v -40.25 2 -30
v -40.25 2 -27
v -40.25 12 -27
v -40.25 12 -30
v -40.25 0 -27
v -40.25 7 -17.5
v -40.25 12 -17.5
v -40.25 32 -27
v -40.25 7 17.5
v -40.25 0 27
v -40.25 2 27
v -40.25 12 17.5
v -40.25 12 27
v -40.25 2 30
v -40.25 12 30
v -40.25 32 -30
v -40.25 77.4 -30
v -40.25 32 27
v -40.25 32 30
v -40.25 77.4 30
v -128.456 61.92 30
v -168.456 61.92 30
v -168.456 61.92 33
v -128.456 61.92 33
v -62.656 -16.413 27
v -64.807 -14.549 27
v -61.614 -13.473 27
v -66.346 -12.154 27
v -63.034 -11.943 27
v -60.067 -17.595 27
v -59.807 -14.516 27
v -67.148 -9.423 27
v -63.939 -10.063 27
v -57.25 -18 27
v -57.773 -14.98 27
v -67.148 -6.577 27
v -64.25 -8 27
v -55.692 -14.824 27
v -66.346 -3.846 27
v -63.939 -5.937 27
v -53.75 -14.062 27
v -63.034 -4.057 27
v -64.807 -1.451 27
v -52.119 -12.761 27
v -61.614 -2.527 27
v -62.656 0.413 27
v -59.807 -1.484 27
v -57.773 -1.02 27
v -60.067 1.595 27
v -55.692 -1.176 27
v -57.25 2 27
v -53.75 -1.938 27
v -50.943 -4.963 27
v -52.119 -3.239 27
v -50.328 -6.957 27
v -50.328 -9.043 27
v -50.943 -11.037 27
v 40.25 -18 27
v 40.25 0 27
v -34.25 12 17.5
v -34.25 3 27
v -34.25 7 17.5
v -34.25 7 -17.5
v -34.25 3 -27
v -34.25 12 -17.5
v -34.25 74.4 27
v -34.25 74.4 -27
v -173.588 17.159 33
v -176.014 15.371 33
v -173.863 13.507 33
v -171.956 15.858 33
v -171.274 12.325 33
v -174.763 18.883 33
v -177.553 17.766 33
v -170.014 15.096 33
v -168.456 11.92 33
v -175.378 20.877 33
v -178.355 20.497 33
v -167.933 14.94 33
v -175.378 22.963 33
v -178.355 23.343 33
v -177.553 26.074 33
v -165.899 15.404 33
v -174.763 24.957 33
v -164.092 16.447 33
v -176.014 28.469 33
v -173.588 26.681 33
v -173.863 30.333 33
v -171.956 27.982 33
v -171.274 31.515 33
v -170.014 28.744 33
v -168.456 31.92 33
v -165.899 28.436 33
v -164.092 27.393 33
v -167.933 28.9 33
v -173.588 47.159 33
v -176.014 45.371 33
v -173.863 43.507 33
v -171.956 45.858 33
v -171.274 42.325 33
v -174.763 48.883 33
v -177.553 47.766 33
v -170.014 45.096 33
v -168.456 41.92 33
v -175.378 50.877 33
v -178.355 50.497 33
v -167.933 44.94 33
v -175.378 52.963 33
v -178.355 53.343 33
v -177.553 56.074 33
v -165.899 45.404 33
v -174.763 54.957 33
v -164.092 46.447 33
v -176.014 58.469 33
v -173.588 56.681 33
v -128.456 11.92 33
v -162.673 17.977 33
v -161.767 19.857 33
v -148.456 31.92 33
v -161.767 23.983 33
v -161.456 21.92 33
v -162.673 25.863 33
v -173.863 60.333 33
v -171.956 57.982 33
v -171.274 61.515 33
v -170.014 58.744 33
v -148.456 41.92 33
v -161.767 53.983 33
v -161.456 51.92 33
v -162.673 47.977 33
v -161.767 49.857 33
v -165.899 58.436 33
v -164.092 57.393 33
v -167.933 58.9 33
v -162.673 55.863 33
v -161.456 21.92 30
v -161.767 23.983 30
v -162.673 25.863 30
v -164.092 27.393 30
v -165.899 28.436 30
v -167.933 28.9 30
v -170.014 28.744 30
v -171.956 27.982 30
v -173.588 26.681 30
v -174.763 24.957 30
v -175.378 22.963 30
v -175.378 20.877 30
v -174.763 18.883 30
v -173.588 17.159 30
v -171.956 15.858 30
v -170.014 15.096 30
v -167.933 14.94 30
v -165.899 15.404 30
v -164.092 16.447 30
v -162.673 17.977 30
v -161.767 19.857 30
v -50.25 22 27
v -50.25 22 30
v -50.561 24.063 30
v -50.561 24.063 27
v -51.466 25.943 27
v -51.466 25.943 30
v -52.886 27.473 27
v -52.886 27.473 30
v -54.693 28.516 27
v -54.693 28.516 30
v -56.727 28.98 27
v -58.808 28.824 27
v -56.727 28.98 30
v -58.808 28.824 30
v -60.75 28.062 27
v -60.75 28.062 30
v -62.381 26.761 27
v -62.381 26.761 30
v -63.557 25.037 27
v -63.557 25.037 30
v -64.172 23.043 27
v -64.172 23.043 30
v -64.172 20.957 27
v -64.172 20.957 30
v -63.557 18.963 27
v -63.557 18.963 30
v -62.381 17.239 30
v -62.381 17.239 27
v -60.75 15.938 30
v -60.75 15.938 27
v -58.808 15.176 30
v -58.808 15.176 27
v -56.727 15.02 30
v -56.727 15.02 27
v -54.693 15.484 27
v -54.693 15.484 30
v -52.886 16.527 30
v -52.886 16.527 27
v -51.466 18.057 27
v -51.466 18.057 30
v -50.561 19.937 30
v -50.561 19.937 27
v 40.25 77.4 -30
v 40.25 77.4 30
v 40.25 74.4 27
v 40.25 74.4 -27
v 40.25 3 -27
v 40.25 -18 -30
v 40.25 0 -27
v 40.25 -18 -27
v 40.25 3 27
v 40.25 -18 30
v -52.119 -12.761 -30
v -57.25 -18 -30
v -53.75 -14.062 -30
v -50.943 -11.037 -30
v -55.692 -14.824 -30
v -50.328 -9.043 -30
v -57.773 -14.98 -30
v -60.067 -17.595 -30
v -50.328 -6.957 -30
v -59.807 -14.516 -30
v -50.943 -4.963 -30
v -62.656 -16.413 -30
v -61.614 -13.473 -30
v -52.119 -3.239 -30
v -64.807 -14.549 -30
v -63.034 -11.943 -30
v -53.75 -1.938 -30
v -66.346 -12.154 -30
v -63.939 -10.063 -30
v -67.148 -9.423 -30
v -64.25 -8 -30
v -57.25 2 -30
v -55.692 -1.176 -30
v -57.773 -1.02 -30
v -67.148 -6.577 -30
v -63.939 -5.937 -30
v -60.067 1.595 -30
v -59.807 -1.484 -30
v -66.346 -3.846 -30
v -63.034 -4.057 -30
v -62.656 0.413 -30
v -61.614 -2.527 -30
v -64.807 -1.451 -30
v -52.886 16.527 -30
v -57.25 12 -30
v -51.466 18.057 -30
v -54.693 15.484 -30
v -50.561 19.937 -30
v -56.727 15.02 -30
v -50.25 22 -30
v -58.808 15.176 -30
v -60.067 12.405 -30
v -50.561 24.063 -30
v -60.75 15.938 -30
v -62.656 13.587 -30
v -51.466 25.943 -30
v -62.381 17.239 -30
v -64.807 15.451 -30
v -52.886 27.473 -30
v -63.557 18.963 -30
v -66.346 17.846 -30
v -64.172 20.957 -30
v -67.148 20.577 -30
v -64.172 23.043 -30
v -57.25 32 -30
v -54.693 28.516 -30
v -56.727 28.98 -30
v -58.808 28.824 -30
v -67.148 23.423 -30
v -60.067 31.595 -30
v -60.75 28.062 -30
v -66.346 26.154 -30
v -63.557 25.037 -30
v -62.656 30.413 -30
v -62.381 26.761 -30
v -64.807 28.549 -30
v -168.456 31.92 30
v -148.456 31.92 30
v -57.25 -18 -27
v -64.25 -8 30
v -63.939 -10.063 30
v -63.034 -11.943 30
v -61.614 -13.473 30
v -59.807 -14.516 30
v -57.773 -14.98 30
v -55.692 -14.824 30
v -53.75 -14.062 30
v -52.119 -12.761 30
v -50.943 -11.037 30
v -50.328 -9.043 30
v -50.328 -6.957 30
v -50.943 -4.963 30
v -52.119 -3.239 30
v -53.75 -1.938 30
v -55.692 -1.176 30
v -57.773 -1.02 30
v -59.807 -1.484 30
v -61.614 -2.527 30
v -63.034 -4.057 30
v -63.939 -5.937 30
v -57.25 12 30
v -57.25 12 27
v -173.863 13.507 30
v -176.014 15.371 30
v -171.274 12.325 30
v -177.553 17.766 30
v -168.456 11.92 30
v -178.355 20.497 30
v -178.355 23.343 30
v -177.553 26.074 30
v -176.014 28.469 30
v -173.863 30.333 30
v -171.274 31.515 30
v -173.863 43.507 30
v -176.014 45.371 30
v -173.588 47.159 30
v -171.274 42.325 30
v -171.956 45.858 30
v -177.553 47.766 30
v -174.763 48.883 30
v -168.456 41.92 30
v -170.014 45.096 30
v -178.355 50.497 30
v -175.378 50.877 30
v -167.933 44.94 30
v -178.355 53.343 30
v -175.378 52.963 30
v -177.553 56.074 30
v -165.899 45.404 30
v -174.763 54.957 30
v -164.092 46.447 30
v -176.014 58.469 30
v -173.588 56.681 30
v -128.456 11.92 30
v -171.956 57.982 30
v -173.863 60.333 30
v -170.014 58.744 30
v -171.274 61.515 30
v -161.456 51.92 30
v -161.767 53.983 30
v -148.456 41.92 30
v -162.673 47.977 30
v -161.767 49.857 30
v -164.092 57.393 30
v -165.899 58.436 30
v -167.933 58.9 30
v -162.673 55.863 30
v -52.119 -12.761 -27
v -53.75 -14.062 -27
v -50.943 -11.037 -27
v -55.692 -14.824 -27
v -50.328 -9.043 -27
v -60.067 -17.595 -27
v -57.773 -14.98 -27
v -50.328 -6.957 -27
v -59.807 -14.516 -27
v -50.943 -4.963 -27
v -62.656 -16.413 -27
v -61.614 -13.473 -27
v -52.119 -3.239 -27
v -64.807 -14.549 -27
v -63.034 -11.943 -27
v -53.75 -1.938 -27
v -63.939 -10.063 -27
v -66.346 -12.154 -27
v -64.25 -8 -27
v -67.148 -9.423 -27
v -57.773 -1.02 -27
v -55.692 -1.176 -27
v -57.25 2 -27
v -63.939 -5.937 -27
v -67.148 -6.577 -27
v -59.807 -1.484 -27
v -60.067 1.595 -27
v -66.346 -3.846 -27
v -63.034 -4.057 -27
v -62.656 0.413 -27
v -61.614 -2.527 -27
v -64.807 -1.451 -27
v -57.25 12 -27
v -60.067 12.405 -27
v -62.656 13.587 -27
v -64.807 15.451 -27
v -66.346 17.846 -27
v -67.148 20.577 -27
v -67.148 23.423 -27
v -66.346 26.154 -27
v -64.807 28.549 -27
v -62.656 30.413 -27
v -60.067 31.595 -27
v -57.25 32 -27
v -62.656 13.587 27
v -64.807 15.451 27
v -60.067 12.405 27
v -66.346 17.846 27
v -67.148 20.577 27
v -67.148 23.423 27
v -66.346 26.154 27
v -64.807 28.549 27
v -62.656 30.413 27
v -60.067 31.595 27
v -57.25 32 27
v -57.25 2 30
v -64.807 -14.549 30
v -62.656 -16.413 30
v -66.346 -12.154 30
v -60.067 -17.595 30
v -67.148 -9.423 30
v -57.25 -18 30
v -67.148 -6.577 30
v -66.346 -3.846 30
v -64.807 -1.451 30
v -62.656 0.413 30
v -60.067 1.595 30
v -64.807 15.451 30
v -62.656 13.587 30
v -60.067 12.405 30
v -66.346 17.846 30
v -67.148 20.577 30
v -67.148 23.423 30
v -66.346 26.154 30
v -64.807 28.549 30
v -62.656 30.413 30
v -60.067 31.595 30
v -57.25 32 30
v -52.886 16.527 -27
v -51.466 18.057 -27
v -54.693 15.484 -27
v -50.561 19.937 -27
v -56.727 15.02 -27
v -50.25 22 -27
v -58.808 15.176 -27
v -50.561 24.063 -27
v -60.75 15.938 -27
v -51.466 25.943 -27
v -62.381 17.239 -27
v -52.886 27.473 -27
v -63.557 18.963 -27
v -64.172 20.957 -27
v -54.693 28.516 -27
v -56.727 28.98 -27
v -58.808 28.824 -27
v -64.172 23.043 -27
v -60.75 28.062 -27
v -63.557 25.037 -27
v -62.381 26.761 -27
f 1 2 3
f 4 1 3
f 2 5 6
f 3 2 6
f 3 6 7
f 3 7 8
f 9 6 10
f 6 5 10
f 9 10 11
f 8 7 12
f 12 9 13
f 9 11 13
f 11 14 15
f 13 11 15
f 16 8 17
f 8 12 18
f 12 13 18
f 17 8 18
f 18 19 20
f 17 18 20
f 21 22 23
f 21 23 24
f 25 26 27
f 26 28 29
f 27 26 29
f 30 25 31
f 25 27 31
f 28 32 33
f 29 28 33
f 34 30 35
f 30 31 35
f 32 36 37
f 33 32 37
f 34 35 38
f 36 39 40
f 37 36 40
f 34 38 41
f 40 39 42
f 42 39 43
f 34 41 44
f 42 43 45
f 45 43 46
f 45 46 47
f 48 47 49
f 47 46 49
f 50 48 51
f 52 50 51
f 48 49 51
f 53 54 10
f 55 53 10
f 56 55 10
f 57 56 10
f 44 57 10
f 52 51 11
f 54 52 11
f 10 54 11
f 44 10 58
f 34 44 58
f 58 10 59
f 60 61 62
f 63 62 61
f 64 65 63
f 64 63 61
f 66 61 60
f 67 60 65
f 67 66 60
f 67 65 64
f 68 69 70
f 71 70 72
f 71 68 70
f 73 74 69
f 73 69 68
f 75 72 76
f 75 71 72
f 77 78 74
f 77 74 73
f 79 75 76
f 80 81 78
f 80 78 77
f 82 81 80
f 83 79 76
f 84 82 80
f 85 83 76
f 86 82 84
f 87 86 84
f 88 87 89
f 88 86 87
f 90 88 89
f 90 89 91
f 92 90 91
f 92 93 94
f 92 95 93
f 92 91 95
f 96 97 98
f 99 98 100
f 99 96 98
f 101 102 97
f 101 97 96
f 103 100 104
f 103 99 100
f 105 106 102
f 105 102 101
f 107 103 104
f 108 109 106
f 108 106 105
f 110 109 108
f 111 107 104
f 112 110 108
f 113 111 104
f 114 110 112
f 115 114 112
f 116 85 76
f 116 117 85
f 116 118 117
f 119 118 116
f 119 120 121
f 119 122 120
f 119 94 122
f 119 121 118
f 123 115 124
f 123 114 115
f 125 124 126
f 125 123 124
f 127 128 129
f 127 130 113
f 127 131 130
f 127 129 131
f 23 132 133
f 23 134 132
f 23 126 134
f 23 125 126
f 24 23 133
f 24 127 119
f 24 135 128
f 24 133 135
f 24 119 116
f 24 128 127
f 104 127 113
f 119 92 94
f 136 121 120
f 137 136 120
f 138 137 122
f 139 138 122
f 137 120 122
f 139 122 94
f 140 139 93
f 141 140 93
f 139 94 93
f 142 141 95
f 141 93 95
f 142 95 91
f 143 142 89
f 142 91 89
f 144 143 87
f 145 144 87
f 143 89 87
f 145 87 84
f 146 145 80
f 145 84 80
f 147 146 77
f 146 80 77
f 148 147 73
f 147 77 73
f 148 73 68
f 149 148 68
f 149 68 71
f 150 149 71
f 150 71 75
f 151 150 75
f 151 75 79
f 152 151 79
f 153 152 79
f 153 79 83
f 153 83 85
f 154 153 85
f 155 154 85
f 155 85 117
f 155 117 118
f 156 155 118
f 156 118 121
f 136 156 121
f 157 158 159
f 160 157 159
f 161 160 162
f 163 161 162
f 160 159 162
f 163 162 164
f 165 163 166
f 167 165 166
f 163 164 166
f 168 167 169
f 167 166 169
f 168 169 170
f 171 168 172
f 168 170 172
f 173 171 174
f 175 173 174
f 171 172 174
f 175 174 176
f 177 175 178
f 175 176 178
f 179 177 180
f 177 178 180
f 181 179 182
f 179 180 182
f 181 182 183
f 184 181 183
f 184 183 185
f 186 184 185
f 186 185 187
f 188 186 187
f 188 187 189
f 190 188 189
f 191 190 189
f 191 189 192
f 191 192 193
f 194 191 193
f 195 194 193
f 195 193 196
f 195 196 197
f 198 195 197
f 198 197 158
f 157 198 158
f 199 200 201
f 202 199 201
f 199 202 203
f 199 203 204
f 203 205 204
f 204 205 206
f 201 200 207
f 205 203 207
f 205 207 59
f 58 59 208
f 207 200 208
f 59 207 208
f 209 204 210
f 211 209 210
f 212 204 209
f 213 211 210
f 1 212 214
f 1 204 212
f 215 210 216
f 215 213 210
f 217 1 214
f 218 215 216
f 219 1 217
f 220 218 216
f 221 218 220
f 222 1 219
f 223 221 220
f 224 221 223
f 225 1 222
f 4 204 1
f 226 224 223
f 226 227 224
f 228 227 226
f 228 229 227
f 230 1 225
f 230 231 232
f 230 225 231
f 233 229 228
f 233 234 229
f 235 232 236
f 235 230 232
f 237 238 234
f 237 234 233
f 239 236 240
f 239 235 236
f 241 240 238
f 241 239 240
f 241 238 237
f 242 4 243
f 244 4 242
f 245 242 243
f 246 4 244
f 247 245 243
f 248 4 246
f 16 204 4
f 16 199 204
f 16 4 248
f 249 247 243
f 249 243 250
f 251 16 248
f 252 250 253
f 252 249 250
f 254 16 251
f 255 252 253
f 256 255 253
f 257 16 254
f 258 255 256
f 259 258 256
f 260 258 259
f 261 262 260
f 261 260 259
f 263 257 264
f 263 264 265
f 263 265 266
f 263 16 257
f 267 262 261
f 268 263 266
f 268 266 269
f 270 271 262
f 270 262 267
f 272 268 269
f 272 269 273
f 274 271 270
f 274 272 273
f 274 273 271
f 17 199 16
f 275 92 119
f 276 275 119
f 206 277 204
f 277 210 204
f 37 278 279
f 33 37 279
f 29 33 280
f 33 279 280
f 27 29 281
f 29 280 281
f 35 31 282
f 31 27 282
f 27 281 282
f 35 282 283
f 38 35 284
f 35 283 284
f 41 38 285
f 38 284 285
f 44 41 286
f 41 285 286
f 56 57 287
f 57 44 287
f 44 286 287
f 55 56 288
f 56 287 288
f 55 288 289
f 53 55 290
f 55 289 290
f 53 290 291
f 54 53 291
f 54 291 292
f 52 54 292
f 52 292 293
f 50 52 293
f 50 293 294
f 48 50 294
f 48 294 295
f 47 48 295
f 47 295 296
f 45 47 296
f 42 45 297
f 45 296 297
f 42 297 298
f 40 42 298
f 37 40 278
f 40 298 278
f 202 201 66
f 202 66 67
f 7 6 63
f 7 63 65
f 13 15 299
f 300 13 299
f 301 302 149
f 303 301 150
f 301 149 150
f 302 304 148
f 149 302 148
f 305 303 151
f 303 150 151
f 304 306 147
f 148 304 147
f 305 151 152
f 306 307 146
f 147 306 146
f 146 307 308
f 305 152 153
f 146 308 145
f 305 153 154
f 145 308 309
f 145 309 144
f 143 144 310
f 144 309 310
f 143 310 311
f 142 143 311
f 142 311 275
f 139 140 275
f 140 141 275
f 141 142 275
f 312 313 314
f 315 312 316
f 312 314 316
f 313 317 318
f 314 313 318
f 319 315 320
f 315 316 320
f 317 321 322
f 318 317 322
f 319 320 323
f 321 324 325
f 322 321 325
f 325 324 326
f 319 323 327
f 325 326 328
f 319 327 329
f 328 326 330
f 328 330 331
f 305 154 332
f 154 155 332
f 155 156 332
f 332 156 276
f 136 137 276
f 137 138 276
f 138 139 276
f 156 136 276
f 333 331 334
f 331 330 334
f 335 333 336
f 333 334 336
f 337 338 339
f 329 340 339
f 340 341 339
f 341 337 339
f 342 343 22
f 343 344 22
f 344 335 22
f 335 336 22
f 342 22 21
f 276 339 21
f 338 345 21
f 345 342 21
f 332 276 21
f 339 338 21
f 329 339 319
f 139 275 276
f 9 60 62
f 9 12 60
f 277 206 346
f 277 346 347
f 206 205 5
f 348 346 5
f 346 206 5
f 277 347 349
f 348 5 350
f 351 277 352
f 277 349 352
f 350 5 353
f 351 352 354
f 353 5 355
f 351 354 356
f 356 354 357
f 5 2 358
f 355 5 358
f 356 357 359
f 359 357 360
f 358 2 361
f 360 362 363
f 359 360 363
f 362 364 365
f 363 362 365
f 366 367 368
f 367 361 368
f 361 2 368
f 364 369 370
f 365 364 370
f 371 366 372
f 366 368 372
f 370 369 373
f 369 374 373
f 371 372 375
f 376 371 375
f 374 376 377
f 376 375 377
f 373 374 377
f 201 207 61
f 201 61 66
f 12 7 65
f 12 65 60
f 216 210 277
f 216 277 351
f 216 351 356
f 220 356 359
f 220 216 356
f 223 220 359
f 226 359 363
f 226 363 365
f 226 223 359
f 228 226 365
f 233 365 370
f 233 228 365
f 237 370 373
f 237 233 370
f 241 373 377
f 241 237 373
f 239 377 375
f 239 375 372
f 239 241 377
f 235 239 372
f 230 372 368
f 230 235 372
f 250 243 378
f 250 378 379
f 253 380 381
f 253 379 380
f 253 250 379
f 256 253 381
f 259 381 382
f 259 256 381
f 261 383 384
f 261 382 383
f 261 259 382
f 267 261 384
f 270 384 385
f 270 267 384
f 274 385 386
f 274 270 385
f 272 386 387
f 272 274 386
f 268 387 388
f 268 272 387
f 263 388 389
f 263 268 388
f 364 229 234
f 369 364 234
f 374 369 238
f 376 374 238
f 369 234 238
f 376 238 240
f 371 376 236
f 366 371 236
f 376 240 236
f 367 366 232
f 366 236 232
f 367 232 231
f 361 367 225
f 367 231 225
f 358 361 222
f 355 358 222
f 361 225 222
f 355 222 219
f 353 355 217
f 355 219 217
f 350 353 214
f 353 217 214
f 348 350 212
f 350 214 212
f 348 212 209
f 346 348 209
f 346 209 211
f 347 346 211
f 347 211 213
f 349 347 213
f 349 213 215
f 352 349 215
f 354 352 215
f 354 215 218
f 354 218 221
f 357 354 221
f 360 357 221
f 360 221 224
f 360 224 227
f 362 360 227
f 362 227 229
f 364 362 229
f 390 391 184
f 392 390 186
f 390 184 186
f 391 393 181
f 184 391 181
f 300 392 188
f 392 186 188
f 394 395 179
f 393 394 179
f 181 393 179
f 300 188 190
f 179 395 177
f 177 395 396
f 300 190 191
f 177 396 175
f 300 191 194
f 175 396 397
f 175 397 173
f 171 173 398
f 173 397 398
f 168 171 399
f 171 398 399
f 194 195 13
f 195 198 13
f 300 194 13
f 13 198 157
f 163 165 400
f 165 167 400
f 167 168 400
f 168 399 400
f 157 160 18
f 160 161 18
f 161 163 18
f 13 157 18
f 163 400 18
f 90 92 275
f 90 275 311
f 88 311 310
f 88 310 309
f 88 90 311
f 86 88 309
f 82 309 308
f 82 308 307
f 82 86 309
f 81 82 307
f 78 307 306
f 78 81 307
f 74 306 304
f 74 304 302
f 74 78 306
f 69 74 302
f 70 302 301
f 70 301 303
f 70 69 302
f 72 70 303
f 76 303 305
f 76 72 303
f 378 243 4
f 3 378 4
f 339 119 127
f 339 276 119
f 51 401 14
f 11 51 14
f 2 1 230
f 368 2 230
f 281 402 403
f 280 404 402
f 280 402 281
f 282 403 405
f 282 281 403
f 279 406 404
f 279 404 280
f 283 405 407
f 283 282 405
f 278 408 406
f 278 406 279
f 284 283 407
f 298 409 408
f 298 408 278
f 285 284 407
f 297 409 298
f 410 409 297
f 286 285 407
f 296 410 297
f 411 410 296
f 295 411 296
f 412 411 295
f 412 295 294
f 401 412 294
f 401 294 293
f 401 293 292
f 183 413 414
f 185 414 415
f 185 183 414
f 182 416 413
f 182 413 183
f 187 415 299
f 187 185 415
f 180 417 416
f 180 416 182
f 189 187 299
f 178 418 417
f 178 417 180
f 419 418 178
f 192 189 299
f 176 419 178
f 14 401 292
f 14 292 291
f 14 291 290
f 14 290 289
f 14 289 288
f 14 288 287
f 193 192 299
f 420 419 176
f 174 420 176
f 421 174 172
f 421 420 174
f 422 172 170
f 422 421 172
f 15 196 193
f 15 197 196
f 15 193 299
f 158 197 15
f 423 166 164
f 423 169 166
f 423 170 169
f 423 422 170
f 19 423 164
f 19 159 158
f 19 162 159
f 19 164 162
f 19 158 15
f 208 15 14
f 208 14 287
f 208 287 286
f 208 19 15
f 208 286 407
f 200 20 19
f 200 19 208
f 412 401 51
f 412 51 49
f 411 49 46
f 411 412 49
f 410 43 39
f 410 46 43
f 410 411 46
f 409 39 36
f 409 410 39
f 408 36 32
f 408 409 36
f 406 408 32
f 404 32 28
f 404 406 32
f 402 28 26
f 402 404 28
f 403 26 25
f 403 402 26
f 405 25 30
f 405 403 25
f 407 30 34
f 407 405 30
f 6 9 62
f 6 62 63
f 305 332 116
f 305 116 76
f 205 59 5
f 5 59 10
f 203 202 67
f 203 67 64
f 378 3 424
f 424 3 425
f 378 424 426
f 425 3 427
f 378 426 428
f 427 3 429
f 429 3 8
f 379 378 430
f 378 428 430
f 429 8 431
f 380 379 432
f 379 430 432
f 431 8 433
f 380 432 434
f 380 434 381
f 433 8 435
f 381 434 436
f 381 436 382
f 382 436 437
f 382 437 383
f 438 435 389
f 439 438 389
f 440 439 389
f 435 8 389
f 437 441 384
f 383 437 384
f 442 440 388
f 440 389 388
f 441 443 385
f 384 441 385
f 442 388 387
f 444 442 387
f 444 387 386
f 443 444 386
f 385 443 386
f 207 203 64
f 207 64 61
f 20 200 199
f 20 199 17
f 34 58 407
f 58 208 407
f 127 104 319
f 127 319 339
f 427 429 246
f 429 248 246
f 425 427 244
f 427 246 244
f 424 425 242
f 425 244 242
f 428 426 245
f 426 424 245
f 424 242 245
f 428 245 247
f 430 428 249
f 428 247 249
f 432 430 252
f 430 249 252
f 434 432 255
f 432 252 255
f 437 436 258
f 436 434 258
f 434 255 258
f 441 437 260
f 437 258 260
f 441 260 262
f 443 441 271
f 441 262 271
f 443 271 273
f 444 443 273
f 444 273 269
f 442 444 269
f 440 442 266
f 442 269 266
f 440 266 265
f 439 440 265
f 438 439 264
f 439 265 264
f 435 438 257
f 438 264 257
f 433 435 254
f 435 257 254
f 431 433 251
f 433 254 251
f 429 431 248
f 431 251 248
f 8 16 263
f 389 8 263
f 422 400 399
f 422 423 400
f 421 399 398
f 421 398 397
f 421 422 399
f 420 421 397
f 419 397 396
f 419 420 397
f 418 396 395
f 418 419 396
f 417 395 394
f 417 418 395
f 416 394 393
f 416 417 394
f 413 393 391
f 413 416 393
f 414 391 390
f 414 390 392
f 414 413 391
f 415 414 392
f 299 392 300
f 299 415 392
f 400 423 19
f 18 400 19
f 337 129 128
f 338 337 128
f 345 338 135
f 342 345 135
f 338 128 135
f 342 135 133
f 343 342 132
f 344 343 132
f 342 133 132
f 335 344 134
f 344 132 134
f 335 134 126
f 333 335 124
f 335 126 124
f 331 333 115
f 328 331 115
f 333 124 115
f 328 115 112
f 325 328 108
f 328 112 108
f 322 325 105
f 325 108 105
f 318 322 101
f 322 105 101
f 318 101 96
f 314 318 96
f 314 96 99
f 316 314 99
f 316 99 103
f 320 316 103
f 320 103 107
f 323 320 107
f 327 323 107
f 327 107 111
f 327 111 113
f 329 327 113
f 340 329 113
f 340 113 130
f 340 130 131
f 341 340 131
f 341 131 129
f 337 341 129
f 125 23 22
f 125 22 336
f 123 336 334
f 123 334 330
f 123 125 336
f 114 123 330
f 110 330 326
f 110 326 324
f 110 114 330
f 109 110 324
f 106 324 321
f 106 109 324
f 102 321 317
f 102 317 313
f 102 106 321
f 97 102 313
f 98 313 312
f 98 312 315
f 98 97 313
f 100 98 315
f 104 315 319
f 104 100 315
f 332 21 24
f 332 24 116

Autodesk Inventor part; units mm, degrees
ref_plane "YZ Plane" through (0, 0, 0) normal (1, 0, 0) x (0, 1, 0)
ref_plane "XZ Plane" through (0, 0, 0) normal (0, 1, 0) x (-1, 0, 0)
ref_plane "XY Plane" through (0, 0, 0) normal (0, 0, 1) x (1, 0, 0)
sketch "Sketch1" plane through (0, 0, 0) normal (0, 1, 0) x (-1, 0, 0)
  line L0 (40.25, 30) -> (-40.25, 30)
  line L1 (-40.25, 30) -> (-40.25, -30)
  line L2 (-40.25, -30) -> (40.25, -30)
  line L3 (40.25, -30) -> (40.25, 30)
  point P0 (0, 0)
  dimension "d0" = 60
  dimension "d1" = 80.5
  dimension "d23" = 30
  dimension "d24" = 40.25
extrude "Extrusion1" add sketch "Sketch1" along normal blind 77.4
sketch "Sketch2" plane through (40.25, 0, 30) normal (1, 0, 0) x (0, 0, -1)
  line L0 (3, 74.4) -> (57, 74.4)
  line L1 (57, 74.4) -> (57, 3)
  line L2 (57, 3) -> (3, 3)
  line L3 (3, 3) -> (3, 74.4)
  line L4 (0, 77.4) -> (60, 77.4) projected
  line L5 (0, 0) -> (0, 77.4) projected
  point P0 (30, 0)
  dimension "d4" = 54
  dimension "d5" = 71.4
  dimension "d6" = 3
  dimension "d7" = 3
sketch "Sketch3" plane through (40.25, 0, 30) normal (1, 0, 0) x (0, 0, -1)
  line L0 (0, 0) -> (60, 0) construction
  line L1 (60, 0) -> (60, 77.4) construction
  line L2 (0, 77.4) -> (60, 77.4) construction
  line L3 (0, 0) -> (0, 77.4) construction
  point P0 (30, 0)
extrude "Extrusion2" cut sketch "Sketch2" against normal blind 74.5
sketch "Sketch4" plane through (-40.25, 0, 30) normal (0, 0, 1) x (1, 0, 0)
  line L0 (0, 12) -> (-17, 12)
  line L1 (-17, 32) -> (0, 32)
  line L2 (0, 32) -> (0, 12)
  line L3 (0, 0) -> (0, 77.4) projected
  line L4 (0, 0) -> (80.5, 0) projected
  circle A0 centre (-17, 22) radius 7
  arc A1 (-17, 32) -> (-17, 12) centre (-17, 22) ccw
  point P0 (40.25, 0)
  dimension "d11" = 20
  dimension "d12" = 0
  dimension "d17" = 14
  dimension "d18" = 22
  dimension "d19" = 20
  dimension "d20" = 17
extrude "Extrusion4" add sketch "Sketch4" against normal blind 3
mirror "Mirror1" about plane through (0, 0, 0) normal (0, 0, 1) of "Extrusion4"
sketch "Sketch7" plane through (-40.25, 0, -30) normal (-1, 0, 0) x (0, 0, 1)
  line L0 (0, 0) -> (60, 0) construction
  line L1 (60, 32) -> (60, 77.4) construction
  line L2 (12.5, 12) -> (47.5, 12)
  line L3 (47.5, 12) -> (47.5, 7)
  line L4 (47.5, 7) -> (12.5, 7)
  line L5 (12.5, 7) -> (12.5, 12)
  point P0 (30, 0)
  dimension "d25" = 35
  dimension "d26" = 5
  dimension "d28" = 12.5
  dimension "d29" = 7
sketch "Sketch8" plane through (-40.25, 0, -30) normal (-1, 0, 0) x (0, 0, 1)
  line L0 (0, 32) -> (3, 32) construction
  line L1 (3, 32) -> (3, 12) construction
  line L2 (3, 12) -> (0, 12) construction
  line L3 (0, 0) -> (0, 12) construction
  line L4 (0, 0) -> (60, 0) construction
  line L5 (60, 0) -> (60, 12) construction
  line L6 (60, 12) -> (57, 12) construction
  line L7 (57, 12) -> (57, 32) construction
  line L8 (57, 32) -> (60, 32) construction
  line L9 (60, 32) -> (60, 77.4) construction
  line L10 (0, 77.4) -> (60, 77.4) construction
  line L11 (0, 32) -> (0, 77.4) construction
  point P0 (30, 0)
extrude "Extrusion6" cut sketch "Sketch7" against normal blind 6
sketch "Sketch10" plane through (40.25, 0, -30) normal (0, 0, -1) x (-1, 0, 0)
  line L0 (80.5, 12) -> (97.5, 12) construction
  line L1 (80.5, 2) -> (97.5, 2)
  line L2 (97.5, 2) -> (97.5, -18)
  line L3 (97.5, -18) -> (80.5, -18)
  line L4 (80.5, -18) -> (80.5, 2)
  circle A0 centre (97.5, -8) radius 10
  arc A1 (97.5, 12) -> (97.5, 32) centre (97.5, 22) ccw construction
  line L5 (80.5, 0) -> (80.5, 12) construction
  point P0 (40.25, 0)
  dimension "d34" = 20
  dimension "d35" = 10
  dimension "d36" = 0
  dimension "d37" = 20
  dimension "d40" = 17
  dimension "d41" = 30
  dimension "d42" = 0
sketch "Sketch13" plane through (40.25, 0, -30) normal (0, 0, -1) x (-1, 0, 0)
  line L0 (0, 0) -> (80.5, 0)
  line L1 (80.5, 0) -> (80.5, -18)
  line L2 (80.5, -18) -> (0, -18)
  line L3 (0, -18) -> (0, 0)
  point P0 (40.25, 0)
  dimension "d43" = 80.5
  dimension "d44" = 18
extrude "Extrusion8" add sketch "Sketch13" against normal blind 3
extrude "Extrusion9" add sketch "Sketch10" against normal blind 3
sketch "Sketch16" plane through (40.25, 77.4, -30) normal (0, 0, -1) x (-1, 0, 0)
  arc A0 (97.5, -95.4) -> (97.5, -75.4) centre (97.5, -85.4) ccw construction
  circle A1 centre (97.5, -85.4) radius 7
  point P0 (40.25, -77.4)
  dimension "d49" = 14
extrude "Extrusion10" cut sketch "Sketch16" against normal blind 3
mirror "Mirror2" about plane through (0, 0, 0) normal (0, 0, 1) of "Extrusion8", "Extrusion9", "Extrusion10"
sketch "Sketch25" plane through (-40.25, 77.4, 30) normal (0, 0, 1) x (1, 0, 0)
  line L0 (-108.2064, -15.48) -> (-88.2064, -15.48)
  line L1 (-88.2064, -15.48) -> (-88.2064, -65.48)
  line L2 (-88.2064, -65.48) -> (-108.2064, -65.48)
  line L3 (-108.2064, -65.48) -> (-108.2064, -15.48)
  point P0 (40.25, -77.4)
  dimension "d59" = 20
  dimension "d60" = 50
extrude "Extrusion13" add sketch "Sketch25" along normal blind 3
sketch "Sketch26" plane through (-40.25, 77.4, 33) normal (0, 0, 1) x (1, 0, 0)
  line L0 (-128.2064, -35.48) -> (-108.2064, -35.48)
  line L1 (-108.2064, -35.48) -> (-108.2064, -15.48)
  line L2 (-108.2064, -15.48) -> (-128.2064, -15.48)
  line L3 (-128.2064, -15.48) -> (-128.2064, -35.48)
  line L4 (-108.2064, -65.48) -> (-128.2064, -65.48)
  line L5 (-128.2064, -65.48) -> (-128.2064, -45.48)
  line L6 (-128.2064, -45.48) -> (-108.2064, -45.48)
  line L7 (-108.2064, -45.48) -> (-108.2064, -65.48)
  circle A0 centre (-128.2064, -25.48) radius 10
  circle A1 centre (-128.2064, -55.48) radius 10
  point P0 (40.25, -77.4)
  dimension "d63" = 20
  dimension "d64" = 20
  dimension "d65" = 20
  dimension "d66" = 20
extrude "Extrusion14" add sketch "Sketch26" against normal blind 3
sketch "Sketch27" plane through (-40.25, 77.4, 33) normal (0, 0, 1) x (1, 0, 0)
  arc A0 (-128.2064, -15.48) -> (-128.2064, -35.48) centre (-128.2064, -25.48) ccw construction
  arc A1 (-128.2064, -45.48) -> (-128.2064, -65.48) centre (-128.2064, -55.48) ccw construction
  circle A2 centre (-128.2064, -25.48) radius 7
  circle A3 centre (-128.2064, -55.48) radius 7
  point P0 (40.25, -77.4)
  dimension "d69" = 14
  dimension "d70" = 14
extrude "Extrusion15" cut sketch "Sketch27" against normal blind 3
properties part number "Tape measure holder case Albert"
